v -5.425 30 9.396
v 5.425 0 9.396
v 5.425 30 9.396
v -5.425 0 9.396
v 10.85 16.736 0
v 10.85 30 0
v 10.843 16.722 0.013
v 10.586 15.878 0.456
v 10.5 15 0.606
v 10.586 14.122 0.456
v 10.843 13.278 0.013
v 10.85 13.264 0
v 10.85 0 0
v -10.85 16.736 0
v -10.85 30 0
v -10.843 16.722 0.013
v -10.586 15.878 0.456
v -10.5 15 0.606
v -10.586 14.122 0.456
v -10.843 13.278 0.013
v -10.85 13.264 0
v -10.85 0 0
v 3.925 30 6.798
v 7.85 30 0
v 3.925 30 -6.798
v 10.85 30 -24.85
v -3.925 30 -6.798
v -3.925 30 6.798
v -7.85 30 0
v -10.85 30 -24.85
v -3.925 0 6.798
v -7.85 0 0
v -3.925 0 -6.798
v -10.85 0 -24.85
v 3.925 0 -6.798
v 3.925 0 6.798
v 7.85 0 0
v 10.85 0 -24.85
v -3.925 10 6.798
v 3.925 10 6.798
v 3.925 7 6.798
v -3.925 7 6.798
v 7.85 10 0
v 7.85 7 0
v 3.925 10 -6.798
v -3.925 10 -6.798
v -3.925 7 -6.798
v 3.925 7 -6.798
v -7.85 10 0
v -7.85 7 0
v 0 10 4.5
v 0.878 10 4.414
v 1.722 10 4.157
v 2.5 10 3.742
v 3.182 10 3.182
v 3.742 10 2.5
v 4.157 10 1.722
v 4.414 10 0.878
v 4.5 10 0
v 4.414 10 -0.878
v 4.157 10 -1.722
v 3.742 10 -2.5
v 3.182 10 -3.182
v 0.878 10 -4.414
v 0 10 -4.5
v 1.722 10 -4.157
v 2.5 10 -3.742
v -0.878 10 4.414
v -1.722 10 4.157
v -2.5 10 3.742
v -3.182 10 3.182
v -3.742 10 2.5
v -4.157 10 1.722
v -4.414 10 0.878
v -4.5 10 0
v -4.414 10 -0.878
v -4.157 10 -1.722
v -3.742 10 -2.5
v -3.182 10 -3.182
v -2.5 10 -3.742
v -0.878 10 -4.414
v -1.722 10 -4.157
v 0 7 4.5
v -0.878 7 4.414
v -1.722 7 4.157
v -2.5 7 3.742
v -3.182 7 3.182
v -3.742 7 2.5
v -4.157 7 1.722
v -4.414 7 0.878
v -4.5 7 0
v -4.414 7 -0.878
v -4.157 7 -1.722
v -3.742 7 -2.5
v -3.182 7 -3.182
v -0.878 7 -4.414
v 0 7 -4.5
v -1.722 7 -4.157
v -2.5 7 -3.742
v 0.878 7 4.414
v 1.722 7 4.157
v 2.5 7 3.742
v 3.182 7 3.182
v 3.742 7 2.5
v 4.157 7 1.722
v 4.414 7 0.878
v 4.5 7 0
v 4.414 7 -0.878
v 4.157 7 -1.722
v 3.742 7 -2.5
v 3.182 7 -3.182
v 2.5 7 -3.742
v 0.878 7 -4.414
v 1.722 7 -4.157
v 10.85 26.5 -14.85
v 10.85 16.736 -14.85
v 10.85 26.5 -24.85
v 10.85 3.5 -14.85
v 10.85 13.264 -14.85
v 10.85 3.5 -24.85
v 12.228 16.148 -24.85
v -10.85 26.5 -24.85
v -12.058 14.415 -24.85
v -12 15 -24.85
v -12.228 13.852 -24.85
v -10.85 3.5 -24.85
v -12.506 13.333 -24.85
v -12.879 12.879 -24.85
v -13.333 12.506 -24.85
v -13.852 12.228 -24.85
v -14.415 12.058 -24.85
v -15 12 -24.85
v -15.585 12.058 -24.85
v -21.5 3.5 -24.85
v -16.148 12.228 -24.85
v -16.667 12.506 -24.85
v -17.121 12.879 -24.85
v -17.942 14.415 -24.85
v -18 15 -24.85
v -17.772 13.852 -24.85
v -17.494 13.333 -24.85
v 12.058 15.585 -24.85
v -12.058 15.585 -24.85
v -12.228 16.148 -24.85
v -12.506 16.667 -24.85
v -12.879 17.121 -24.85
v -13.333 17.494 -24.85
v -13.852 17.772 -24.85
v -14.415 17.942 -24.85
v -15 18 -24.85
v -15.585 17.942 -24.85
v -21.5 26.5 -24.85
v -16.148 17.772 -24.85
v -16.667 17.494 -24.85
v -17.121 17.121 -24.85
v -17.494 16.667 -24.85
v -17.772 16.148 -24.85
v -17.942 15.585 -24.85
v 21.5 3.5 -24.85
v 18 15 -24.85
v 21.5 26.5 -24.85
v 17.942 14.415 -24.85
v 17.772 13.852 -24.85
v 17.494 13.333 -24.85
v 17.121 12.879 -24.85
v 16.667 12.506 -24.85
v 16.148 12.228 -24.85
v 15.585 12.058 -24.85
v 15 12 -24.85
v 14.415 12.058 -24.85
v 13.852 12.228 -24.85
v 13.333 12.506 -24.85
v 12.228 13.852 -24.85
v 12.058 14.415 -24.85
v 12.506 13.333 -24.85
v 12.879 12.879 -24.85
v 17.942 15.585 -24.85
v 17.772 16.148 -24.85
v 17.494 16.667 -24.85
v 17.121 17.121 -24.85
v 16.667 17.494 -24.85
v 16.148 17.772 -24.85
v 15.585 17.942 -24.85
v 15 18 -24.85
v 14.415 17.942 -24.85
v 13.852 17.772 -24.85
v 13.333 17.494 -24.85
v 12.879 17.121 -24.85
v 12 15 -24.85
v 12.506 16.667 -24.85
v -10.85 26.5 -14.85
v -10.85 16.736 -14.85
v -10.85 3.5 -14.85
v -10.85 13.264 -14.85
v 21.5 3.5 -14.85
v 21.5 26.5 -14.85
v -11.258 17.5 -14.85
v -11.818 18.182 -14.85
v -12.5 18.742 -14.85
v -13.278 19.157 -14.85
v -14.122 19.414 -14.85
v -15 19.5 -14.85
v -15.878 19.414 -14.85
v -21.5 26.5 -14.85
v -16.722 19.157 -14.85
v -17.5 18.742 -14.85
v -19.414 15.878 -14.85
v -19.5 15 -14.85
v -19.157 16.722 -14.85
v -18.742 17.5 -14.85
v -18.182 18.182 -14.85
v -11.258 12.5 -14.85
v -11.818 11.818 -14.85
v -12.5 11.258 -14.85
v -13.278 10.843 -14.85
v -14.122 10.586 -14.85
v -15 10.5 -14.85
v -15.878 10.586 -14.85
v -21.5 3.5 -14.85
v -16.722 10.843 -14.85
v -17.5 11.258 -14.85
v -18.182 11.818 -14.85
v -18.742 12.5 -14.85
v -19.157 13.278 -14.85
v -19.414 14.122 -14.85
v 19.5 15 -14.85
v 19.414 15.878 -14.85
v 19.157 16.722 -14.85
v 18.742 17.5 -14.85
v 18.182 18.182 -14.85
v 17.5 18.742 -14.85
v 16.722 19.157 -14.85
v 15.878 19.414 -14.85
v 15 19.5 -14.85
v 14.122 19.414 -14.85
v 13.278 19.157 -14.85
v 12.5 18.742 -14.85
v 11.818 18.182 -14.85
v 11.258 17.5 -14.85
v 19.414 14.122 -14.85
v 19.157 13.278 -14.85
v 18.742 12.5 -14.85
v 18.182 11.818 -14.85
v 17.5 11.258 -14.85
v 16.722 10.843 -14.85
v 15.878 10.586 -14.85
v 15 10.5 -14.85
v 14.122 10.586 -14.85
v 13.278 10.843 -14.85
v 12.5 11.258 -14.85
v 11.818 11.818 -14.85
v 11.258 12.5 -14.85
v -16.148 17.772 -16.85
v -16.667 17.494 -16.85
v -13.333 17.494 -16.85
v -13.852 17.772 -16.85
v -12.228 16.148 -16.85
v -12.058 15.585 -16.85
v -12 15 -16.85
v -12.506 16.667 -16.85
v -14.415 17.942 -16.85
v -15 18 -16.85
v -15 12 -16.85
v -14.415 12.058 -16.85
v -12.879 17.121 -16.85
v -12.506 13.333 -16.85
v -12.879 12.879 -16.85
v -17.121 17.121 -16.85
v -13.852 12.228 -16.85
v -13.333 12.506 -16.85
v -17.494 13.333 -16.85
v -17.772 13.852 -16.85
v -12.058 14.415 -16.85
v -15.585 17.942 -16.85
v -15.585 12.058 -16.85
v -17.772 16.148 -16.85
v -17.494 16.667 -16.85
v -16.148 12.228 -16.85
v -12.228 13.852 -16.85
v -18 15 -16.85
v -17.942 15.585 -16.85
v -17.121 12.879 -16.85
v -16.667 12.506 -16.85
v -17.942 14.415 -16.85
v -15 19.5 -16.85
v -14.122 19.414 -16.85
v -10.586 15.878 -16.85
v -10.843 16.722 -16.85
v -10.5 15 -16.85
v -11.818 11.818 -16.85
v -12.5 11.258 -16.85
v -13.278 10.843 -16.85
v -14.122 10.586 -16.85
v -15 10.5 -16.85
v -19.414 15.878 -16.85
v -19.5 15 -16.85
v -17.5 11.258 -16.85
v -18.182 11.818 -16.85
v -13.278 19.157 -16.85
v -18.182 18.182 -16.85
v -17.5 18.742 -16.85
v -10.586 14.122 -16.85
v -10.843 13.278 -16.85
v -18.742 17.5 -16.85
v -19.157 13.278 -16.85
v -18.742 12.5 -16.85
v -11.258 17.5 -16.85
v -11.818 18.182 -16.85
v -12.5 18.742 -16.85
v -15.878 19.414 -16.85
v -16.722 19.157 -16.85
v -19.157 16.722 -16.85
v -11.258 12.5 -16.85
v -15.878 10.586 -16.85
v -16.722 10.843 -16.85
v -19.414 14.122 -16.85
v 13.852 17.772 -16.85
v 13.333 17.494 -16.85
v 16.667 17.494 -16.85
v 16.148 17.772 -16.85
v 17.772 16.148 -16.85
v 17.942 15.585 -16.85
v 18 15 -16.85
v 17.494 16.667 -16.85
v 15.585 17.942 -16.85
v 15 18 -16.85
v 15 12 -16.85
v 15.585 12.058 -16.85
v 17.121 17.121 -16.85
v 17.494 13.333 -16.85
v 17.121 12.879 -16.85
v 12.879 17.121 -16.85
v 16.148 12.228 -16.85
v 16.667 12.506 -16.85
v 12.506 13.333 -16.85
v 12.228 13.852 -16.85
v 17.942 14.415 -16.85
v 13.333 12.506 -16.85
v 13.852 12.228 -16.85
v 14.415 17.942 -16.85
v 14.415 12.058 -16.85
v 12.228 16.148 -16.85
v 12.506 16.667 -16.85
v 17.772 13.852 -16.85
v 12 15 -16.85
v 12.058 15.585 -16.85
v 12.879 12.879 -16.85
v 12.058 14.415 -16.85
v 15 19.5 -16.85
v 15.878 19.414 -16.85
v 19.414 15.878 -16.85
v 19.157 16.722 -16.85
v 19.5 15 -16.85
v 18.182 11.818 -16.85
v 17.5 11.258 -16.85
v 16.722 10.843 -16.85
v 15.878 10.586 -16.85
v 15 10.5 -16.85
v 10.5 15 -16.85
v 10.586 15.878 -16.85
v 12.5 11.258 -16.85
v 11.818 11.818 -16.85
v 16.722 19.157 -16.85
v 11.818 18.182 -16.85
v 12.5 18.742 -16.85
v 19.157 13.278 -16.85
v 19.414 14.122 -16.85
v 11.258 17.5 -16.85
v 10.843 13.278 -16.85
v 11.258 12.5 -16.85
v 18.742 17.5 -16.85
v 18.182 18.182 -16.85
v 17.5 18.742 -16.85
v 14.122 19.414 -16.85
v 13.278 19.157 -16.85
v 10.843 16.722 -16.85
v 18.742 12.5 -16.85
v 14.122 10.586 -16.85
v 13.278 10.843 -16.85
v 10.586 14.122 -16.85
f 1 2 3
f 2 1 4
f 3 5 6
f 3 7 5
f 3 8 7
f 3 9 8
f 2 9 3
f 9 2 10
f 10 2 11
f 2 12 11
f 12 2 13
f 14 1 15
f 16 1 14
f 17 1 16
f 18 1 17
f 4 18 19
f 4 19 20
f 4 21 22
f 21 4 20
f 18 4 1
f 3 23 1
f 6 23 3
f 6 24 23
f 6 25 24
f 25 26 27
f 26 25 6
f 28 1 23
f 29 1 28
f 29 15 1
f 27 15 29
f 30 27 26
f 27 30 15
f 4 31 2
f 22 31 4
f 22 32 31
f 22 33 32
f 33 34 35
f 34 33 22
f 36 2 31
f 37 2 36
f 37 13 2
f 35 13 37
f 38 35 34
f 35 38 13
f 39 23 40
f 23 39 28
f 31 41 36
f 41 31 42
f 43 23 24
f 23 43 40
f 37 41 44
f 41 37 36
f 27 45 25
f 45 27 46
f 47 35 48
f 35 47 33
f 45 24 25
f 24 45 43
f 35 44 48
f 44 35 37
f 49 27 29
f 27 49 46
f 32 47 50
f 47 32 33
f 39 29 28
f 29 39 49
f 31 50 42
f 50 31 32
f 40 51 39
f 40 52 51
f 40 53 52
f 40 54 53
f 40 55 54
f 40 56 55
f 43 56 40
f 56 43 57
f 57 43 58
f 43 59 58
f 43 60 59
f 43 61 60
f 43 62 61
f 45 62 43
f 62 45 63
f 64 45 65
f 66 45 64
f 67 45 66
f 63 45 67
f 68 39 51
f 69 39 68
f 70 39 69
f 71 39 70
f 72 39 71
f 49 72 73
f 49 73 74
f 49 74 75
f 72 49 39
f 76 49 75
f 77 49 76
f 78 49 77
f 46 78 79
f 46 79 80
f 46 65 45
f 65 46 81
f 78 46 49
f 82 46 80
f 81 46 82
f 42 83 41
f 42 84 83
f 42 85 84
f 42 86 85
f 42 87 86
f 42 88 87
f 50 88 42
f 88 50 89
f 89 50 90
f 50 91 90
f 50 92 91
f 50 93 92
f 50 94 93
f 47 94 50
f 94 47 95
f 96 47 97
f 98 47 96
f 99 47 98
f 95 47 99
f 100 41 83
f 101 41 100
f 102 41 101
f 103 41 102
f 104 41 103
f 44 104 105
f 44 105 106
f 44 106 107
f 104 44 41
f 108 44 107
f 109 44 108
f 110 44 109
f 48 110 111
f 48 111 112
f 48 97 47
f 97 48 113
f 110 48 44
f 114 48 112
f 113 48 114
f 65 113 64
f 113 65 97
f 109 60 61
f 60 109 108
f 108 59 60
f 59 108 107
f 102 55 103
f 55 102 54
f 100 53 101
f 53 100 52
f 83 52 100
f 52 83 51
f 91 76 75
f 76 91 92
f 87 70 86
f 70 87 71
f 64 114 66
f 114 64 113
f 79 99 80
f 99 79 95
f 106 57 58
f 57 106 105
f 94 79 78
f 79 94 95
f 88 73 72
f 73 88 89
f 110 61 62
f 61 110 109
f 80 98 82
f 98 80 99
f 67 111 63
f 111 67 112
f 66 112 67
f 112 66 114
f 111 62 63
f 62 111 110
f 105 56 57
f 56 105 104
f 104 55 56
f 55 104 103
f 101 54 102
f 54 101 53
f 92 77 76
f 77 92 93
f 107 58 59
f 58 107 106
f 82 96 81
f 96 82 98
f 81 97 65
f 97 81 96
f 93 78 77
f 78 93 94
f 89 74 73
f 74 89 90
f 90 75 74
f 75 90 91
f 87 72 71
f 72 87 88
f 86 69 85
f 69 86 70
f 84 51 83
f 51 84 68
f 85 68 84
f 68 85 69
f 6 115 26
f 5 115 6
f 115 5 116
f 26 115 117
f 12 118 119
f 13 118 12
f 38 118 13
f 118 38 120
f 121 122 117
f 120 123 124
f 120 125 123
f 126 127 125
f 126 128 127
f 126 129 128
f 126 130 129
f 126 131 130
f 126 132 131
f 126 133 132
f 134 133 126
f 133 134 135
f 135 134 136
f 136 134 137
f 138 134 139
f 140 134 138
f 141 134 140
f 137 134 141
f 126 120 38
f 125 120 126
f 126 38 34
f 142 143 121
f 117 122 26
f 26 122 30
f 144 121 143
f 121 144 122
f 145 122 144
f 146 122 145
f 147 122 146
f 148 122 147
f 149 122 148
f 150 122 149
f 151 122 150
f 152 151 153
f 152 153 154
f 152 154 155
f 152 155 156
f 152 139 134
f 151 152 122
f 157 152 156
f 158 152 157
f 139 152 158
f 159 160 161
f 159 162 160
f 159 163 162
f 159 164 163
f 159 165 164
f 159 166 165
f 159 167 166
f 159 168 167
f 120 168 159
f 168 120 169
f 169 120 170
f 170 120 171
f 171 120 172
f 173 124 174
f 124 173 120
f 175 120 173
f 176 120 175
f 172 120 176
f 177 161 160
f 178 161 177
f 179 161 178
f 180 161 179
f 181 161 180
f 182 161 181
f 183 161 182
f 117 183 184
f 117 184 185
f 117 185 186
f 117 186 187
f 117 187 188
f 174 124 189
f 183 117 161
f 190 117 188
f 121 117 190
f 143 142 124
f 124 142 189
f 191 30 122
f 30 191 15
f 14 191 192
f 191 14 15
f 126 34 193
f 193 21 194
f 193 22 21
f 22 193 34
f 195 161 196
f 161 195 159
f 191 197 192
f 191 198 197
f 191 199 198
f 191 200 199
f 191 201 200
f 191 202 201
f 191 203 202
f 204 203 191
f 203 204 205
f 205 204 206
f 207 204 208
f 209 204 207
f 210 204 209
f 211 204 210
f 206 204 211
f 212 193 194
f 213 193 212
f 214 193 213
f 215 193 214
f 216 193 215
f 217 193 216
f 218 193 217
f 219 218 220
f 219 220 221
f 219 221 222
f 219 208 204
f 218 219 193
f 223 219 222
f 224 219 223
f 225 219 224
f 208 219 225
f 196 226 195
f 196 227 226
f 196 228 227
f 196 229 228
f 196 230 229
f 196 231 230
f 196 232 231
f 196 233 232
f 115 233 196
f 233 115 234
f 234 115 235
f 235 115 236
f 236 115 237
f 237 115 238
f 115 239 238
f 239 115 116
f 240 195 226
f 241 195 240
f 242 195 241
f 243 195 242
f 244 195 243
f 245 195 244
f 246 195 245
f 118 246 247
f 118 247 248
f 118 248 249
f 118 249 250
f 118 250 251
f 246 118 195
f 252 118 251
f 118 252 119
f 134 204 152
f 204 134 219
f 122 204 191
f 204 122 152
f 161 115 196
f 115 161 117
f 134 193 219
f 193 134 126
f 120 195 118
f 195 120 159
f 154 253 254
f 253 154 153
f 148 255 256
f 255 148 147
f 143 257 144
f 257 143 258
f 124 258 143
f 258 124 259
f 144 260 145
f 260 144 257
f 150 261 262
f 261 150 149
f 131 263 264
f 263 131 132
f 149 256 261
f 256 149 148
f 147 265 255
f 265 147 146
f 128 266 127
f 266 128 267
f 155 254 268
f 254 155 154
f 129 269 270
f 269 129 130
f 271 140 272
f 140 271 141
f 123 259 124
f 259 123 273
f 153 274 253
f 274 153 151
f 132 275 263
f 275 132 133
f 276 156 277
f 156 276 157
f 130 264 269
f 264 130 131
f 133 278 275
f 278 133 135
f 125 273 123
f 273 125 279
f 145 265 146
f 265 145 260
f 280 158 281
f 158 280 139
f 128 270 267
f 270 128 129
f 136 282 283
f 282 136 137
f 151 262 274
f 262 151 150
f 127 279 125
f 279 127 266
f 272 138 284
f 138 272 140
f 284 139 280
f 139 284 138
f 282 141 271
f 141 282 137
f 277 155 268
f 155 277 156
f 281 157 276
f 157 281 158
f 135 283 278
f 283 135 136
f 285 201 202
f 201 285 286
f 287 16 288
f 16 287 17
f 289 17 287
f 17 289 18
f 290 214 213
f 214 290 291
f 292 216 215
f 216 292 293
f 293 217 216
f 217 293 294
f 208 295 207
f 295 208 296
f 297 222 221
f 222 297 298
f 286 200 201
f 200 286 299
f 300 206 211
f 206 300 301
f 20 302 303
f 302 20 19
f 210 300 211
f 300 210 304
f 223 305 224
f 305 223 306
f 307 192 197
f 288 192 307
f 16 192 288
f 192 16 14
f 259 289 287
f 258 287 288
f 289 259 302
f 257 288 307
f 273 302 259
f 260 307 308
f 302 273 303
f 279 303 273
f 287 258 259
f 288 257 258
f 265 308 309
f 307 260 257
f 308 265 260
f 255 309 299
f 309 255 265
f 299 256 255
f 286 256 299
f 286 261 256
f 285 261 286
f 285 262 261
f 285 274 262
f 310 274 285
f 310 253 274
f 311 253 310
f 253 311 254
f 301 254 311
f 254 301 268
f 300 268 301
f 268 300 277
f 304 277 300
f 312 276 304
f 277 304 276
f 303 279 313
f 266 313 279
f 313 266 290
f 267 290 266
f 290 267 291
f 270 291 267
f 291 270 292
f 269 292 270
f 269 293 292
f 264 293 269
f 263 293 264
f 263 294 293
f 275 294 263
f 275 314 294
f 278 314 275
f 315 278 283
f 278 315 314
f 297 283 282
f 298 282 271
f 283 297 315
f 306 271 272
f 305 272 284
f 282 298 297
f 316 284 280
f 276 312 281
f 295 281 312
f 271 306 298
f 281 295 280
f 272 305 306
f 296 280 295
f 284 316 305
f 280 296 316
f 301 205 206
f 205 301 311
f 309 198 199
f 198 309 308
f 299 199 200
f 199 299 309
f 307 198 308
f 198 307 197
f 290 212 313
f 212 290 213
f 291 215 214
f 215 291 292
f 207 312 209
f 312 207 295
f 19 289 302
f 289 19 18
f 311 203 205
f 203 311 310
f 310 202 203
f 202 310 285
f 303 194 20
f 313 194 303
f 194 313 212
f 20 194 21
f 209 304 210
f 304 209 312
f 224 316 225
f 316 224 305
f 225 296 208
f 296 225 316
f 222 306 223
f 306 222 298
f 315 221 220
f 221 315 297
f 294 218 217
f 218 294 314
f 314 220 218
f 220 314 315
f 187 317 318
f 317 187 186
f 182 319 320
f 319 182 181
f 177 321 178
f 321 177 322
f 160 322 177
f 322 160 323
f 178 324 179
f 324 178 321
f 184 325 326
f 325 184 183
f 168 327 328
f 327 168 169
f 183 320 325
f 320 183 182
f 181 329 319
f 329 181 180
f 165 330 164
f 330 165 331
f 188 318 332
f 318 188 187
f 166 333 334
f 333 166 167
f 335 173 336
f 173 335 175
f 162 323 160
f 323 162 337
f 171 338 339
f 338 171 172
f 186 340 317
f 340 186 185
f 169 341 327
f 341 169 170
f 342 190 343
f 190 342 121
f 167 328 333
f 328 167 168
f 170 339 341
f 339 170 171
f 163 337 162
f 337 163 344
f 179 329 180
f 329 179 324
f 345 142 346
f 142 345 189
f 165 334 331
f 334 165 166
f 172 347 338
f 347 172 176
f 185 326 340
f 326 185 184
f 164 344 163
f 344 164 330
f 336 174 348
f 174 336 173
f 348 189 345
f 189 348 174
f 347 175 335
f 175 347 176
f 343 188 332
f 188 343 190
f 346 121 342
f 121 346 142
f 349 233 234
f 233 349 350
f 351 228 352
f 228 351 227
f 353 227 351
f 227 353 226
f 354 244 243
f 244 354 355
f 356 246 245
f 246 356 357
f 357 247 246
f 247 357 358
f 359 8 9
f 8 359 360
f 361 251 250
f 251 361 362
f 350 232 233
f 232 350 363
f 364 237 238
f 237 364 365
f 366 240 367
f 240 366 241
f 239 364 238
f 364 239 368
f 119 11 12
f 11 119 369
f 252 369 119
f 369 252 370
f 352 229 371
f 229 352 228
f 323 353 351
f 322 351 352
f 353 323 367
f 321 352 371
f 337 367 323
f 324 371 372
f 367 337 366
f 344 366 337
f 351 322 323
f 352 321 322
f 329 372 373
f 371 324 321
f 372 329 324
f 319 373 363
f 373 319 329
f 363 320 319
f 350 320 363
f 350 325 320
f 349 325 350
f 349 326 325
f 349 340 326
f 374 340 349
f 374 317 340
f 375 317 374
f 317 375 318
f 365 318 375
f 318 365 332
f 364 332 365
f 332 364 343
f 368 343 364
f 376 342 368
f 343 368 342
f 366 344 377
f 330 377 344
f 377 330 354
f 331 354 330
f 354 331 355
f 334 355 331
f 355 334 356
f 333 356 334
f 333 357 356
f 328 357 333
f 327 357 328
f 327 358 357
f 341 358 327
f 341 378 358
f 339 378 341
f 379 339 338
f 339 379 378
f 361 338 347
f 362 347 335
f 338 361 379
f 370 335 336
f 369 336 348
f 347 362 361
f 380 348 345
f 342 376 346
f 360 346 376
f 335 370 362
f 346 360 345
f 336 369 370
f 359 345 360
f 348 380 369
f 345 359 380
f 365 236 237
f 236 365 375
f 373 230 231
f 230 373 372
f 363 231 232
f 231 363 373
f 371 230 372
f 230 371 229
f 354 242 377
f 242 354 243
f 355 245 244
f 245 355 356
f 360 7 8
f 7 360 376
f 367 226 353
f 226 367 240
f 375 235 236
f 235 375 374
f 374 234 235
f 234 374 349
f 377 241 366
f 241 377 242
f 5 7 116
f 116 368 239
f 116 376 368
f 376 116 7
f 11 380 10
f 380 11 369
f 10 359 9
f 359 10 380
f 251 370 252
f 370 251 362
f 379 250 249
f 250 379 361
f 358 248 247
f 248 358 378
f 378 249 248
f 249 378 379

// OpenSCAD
m8_shaft_diameter = 9;
m8_nut_diameter = 15.7;
m8_pocket_depth = 7;
nut_holder_len = 30;
nut_holder_wall = 3;
nut_bottom_wall = 3;
nut_holder_outer_diam = m8_nut_diameter+2*nut_holder_wall;
nut_holder_flat_diam = nut_holder_outer_diam/(2*sqrt(1+(1/3)));

module leadscrew_nut_holder() {
	// rotate so hexagon is along positive y axis
	rotate([-90,0,0]){
		difference() {
			union() {
				// main hut holder profile
				difference() {
					// outer hexagon
					cylinder(r=nut_holder_outer_diam/2, h=nut_holder_len, $fn=6);
					// cut out inner hexagon at size of expected nut
					translate([0,0,-1])
						cylinder(r=m8_nut_diameter/2, h=nut_holder_len+2, $fn=6);
				}
				// wall below top nut
				translate([0,0,m8_pocket_depth])
					cylinder(r=nut_holder_outer_diam/2, h=nut_bottom_wall, $fn=6); 
			}
			// cut out shaft hole
			cylinder(r=m8_shaft_diameter/2, h=nut_holder_len, $fn=32);
		}
	}
}

module leadscrew_nut_holder_profile() {
	// rotate so hexagon is along positive y axis
	rotate([-90,0,0])
		// outer hexagon only
		translate([0,0,-1])
			cylinder(r=nut_holder_outer_diam/2, h=nut_holder_len+2, $fn=6);
}

m5_shaft_diam = 6;
m5_head_diam = 9;
m5_head_inset_adjust = -2; // use to move screw up/down to accomodate screws we have
m5_head_inset = 3 + m5_head_inset_adjust;

dist_to_wheel = 13/*10*/;
half_wheel = 11/2;
wheel_spacer = 25.4/4 /* 1/4" */;
x_axis_plate_thick = 0/*6*/;  // now assuming acrylic spacer under this
dist_fine_tune = 0;

dist_to_shaft = dist_to_wheel+half_wheel+wheel_spacer+x_axis_plate_thick+dist_fine_tune;
block_margin = 2;
mounting_spread_w = 30;
mounting_spread_h = 10/*20*/;
block_base_w = mounting_spread_w+m5_head_diam+2*block_margin;
block_base_h = mounting_spread_h+m5_head_diam+2*block_margin;
block_base_thick = 10;

module leadscrew_block() { 
    	difference() {
		union() {
			// nut holder
			leadscrew_nut_holder();
			// center support block under nut holder
			difference() {
				translate([-nut_holder_outer_diam/2,0,-dist_to_shaft])
					cube([nut_holder_outer_diam,nut_holder_len,dist_to_shaft]);
				leadscrew_nut_holder_profile();
			}
			// mounting block base
			translate([-block_base_w/2,
										-(block_base_h-nut_holder_len)/2,-dist_to_shaft]) 
				cube([block_base_w,block_base_h,block_base_thick]);
		}
		// mounting holes
		translate([-block_base_w/2,
										-(block_base_h-nut_holder_len)/2,-dist_to_shaft]) 
		translate([m5_head_diam/2+block_margin, m5_head_diam/2+block_margin, -1]) 
		union() {
			for (xoff=[0,mounting_spread_w]) {
                for (yoff=[/*0,*/mounting_spread_h/2/*,mounting_spread_h*/]) {
					translate([xoff,yoff,0]) {
					// bolt hole
					cylinder(r=m5_shaft_diam/2, h=block_base_thick+2,$fn=32);
					// countersink for head
					translate([0,0,block_base_thick-m5_head_inset])
						cylinder(r=m5_head_diam/2, h=500,$fn=32);
					}
				}
			}
		}
	}
}

leadscrew_block();
